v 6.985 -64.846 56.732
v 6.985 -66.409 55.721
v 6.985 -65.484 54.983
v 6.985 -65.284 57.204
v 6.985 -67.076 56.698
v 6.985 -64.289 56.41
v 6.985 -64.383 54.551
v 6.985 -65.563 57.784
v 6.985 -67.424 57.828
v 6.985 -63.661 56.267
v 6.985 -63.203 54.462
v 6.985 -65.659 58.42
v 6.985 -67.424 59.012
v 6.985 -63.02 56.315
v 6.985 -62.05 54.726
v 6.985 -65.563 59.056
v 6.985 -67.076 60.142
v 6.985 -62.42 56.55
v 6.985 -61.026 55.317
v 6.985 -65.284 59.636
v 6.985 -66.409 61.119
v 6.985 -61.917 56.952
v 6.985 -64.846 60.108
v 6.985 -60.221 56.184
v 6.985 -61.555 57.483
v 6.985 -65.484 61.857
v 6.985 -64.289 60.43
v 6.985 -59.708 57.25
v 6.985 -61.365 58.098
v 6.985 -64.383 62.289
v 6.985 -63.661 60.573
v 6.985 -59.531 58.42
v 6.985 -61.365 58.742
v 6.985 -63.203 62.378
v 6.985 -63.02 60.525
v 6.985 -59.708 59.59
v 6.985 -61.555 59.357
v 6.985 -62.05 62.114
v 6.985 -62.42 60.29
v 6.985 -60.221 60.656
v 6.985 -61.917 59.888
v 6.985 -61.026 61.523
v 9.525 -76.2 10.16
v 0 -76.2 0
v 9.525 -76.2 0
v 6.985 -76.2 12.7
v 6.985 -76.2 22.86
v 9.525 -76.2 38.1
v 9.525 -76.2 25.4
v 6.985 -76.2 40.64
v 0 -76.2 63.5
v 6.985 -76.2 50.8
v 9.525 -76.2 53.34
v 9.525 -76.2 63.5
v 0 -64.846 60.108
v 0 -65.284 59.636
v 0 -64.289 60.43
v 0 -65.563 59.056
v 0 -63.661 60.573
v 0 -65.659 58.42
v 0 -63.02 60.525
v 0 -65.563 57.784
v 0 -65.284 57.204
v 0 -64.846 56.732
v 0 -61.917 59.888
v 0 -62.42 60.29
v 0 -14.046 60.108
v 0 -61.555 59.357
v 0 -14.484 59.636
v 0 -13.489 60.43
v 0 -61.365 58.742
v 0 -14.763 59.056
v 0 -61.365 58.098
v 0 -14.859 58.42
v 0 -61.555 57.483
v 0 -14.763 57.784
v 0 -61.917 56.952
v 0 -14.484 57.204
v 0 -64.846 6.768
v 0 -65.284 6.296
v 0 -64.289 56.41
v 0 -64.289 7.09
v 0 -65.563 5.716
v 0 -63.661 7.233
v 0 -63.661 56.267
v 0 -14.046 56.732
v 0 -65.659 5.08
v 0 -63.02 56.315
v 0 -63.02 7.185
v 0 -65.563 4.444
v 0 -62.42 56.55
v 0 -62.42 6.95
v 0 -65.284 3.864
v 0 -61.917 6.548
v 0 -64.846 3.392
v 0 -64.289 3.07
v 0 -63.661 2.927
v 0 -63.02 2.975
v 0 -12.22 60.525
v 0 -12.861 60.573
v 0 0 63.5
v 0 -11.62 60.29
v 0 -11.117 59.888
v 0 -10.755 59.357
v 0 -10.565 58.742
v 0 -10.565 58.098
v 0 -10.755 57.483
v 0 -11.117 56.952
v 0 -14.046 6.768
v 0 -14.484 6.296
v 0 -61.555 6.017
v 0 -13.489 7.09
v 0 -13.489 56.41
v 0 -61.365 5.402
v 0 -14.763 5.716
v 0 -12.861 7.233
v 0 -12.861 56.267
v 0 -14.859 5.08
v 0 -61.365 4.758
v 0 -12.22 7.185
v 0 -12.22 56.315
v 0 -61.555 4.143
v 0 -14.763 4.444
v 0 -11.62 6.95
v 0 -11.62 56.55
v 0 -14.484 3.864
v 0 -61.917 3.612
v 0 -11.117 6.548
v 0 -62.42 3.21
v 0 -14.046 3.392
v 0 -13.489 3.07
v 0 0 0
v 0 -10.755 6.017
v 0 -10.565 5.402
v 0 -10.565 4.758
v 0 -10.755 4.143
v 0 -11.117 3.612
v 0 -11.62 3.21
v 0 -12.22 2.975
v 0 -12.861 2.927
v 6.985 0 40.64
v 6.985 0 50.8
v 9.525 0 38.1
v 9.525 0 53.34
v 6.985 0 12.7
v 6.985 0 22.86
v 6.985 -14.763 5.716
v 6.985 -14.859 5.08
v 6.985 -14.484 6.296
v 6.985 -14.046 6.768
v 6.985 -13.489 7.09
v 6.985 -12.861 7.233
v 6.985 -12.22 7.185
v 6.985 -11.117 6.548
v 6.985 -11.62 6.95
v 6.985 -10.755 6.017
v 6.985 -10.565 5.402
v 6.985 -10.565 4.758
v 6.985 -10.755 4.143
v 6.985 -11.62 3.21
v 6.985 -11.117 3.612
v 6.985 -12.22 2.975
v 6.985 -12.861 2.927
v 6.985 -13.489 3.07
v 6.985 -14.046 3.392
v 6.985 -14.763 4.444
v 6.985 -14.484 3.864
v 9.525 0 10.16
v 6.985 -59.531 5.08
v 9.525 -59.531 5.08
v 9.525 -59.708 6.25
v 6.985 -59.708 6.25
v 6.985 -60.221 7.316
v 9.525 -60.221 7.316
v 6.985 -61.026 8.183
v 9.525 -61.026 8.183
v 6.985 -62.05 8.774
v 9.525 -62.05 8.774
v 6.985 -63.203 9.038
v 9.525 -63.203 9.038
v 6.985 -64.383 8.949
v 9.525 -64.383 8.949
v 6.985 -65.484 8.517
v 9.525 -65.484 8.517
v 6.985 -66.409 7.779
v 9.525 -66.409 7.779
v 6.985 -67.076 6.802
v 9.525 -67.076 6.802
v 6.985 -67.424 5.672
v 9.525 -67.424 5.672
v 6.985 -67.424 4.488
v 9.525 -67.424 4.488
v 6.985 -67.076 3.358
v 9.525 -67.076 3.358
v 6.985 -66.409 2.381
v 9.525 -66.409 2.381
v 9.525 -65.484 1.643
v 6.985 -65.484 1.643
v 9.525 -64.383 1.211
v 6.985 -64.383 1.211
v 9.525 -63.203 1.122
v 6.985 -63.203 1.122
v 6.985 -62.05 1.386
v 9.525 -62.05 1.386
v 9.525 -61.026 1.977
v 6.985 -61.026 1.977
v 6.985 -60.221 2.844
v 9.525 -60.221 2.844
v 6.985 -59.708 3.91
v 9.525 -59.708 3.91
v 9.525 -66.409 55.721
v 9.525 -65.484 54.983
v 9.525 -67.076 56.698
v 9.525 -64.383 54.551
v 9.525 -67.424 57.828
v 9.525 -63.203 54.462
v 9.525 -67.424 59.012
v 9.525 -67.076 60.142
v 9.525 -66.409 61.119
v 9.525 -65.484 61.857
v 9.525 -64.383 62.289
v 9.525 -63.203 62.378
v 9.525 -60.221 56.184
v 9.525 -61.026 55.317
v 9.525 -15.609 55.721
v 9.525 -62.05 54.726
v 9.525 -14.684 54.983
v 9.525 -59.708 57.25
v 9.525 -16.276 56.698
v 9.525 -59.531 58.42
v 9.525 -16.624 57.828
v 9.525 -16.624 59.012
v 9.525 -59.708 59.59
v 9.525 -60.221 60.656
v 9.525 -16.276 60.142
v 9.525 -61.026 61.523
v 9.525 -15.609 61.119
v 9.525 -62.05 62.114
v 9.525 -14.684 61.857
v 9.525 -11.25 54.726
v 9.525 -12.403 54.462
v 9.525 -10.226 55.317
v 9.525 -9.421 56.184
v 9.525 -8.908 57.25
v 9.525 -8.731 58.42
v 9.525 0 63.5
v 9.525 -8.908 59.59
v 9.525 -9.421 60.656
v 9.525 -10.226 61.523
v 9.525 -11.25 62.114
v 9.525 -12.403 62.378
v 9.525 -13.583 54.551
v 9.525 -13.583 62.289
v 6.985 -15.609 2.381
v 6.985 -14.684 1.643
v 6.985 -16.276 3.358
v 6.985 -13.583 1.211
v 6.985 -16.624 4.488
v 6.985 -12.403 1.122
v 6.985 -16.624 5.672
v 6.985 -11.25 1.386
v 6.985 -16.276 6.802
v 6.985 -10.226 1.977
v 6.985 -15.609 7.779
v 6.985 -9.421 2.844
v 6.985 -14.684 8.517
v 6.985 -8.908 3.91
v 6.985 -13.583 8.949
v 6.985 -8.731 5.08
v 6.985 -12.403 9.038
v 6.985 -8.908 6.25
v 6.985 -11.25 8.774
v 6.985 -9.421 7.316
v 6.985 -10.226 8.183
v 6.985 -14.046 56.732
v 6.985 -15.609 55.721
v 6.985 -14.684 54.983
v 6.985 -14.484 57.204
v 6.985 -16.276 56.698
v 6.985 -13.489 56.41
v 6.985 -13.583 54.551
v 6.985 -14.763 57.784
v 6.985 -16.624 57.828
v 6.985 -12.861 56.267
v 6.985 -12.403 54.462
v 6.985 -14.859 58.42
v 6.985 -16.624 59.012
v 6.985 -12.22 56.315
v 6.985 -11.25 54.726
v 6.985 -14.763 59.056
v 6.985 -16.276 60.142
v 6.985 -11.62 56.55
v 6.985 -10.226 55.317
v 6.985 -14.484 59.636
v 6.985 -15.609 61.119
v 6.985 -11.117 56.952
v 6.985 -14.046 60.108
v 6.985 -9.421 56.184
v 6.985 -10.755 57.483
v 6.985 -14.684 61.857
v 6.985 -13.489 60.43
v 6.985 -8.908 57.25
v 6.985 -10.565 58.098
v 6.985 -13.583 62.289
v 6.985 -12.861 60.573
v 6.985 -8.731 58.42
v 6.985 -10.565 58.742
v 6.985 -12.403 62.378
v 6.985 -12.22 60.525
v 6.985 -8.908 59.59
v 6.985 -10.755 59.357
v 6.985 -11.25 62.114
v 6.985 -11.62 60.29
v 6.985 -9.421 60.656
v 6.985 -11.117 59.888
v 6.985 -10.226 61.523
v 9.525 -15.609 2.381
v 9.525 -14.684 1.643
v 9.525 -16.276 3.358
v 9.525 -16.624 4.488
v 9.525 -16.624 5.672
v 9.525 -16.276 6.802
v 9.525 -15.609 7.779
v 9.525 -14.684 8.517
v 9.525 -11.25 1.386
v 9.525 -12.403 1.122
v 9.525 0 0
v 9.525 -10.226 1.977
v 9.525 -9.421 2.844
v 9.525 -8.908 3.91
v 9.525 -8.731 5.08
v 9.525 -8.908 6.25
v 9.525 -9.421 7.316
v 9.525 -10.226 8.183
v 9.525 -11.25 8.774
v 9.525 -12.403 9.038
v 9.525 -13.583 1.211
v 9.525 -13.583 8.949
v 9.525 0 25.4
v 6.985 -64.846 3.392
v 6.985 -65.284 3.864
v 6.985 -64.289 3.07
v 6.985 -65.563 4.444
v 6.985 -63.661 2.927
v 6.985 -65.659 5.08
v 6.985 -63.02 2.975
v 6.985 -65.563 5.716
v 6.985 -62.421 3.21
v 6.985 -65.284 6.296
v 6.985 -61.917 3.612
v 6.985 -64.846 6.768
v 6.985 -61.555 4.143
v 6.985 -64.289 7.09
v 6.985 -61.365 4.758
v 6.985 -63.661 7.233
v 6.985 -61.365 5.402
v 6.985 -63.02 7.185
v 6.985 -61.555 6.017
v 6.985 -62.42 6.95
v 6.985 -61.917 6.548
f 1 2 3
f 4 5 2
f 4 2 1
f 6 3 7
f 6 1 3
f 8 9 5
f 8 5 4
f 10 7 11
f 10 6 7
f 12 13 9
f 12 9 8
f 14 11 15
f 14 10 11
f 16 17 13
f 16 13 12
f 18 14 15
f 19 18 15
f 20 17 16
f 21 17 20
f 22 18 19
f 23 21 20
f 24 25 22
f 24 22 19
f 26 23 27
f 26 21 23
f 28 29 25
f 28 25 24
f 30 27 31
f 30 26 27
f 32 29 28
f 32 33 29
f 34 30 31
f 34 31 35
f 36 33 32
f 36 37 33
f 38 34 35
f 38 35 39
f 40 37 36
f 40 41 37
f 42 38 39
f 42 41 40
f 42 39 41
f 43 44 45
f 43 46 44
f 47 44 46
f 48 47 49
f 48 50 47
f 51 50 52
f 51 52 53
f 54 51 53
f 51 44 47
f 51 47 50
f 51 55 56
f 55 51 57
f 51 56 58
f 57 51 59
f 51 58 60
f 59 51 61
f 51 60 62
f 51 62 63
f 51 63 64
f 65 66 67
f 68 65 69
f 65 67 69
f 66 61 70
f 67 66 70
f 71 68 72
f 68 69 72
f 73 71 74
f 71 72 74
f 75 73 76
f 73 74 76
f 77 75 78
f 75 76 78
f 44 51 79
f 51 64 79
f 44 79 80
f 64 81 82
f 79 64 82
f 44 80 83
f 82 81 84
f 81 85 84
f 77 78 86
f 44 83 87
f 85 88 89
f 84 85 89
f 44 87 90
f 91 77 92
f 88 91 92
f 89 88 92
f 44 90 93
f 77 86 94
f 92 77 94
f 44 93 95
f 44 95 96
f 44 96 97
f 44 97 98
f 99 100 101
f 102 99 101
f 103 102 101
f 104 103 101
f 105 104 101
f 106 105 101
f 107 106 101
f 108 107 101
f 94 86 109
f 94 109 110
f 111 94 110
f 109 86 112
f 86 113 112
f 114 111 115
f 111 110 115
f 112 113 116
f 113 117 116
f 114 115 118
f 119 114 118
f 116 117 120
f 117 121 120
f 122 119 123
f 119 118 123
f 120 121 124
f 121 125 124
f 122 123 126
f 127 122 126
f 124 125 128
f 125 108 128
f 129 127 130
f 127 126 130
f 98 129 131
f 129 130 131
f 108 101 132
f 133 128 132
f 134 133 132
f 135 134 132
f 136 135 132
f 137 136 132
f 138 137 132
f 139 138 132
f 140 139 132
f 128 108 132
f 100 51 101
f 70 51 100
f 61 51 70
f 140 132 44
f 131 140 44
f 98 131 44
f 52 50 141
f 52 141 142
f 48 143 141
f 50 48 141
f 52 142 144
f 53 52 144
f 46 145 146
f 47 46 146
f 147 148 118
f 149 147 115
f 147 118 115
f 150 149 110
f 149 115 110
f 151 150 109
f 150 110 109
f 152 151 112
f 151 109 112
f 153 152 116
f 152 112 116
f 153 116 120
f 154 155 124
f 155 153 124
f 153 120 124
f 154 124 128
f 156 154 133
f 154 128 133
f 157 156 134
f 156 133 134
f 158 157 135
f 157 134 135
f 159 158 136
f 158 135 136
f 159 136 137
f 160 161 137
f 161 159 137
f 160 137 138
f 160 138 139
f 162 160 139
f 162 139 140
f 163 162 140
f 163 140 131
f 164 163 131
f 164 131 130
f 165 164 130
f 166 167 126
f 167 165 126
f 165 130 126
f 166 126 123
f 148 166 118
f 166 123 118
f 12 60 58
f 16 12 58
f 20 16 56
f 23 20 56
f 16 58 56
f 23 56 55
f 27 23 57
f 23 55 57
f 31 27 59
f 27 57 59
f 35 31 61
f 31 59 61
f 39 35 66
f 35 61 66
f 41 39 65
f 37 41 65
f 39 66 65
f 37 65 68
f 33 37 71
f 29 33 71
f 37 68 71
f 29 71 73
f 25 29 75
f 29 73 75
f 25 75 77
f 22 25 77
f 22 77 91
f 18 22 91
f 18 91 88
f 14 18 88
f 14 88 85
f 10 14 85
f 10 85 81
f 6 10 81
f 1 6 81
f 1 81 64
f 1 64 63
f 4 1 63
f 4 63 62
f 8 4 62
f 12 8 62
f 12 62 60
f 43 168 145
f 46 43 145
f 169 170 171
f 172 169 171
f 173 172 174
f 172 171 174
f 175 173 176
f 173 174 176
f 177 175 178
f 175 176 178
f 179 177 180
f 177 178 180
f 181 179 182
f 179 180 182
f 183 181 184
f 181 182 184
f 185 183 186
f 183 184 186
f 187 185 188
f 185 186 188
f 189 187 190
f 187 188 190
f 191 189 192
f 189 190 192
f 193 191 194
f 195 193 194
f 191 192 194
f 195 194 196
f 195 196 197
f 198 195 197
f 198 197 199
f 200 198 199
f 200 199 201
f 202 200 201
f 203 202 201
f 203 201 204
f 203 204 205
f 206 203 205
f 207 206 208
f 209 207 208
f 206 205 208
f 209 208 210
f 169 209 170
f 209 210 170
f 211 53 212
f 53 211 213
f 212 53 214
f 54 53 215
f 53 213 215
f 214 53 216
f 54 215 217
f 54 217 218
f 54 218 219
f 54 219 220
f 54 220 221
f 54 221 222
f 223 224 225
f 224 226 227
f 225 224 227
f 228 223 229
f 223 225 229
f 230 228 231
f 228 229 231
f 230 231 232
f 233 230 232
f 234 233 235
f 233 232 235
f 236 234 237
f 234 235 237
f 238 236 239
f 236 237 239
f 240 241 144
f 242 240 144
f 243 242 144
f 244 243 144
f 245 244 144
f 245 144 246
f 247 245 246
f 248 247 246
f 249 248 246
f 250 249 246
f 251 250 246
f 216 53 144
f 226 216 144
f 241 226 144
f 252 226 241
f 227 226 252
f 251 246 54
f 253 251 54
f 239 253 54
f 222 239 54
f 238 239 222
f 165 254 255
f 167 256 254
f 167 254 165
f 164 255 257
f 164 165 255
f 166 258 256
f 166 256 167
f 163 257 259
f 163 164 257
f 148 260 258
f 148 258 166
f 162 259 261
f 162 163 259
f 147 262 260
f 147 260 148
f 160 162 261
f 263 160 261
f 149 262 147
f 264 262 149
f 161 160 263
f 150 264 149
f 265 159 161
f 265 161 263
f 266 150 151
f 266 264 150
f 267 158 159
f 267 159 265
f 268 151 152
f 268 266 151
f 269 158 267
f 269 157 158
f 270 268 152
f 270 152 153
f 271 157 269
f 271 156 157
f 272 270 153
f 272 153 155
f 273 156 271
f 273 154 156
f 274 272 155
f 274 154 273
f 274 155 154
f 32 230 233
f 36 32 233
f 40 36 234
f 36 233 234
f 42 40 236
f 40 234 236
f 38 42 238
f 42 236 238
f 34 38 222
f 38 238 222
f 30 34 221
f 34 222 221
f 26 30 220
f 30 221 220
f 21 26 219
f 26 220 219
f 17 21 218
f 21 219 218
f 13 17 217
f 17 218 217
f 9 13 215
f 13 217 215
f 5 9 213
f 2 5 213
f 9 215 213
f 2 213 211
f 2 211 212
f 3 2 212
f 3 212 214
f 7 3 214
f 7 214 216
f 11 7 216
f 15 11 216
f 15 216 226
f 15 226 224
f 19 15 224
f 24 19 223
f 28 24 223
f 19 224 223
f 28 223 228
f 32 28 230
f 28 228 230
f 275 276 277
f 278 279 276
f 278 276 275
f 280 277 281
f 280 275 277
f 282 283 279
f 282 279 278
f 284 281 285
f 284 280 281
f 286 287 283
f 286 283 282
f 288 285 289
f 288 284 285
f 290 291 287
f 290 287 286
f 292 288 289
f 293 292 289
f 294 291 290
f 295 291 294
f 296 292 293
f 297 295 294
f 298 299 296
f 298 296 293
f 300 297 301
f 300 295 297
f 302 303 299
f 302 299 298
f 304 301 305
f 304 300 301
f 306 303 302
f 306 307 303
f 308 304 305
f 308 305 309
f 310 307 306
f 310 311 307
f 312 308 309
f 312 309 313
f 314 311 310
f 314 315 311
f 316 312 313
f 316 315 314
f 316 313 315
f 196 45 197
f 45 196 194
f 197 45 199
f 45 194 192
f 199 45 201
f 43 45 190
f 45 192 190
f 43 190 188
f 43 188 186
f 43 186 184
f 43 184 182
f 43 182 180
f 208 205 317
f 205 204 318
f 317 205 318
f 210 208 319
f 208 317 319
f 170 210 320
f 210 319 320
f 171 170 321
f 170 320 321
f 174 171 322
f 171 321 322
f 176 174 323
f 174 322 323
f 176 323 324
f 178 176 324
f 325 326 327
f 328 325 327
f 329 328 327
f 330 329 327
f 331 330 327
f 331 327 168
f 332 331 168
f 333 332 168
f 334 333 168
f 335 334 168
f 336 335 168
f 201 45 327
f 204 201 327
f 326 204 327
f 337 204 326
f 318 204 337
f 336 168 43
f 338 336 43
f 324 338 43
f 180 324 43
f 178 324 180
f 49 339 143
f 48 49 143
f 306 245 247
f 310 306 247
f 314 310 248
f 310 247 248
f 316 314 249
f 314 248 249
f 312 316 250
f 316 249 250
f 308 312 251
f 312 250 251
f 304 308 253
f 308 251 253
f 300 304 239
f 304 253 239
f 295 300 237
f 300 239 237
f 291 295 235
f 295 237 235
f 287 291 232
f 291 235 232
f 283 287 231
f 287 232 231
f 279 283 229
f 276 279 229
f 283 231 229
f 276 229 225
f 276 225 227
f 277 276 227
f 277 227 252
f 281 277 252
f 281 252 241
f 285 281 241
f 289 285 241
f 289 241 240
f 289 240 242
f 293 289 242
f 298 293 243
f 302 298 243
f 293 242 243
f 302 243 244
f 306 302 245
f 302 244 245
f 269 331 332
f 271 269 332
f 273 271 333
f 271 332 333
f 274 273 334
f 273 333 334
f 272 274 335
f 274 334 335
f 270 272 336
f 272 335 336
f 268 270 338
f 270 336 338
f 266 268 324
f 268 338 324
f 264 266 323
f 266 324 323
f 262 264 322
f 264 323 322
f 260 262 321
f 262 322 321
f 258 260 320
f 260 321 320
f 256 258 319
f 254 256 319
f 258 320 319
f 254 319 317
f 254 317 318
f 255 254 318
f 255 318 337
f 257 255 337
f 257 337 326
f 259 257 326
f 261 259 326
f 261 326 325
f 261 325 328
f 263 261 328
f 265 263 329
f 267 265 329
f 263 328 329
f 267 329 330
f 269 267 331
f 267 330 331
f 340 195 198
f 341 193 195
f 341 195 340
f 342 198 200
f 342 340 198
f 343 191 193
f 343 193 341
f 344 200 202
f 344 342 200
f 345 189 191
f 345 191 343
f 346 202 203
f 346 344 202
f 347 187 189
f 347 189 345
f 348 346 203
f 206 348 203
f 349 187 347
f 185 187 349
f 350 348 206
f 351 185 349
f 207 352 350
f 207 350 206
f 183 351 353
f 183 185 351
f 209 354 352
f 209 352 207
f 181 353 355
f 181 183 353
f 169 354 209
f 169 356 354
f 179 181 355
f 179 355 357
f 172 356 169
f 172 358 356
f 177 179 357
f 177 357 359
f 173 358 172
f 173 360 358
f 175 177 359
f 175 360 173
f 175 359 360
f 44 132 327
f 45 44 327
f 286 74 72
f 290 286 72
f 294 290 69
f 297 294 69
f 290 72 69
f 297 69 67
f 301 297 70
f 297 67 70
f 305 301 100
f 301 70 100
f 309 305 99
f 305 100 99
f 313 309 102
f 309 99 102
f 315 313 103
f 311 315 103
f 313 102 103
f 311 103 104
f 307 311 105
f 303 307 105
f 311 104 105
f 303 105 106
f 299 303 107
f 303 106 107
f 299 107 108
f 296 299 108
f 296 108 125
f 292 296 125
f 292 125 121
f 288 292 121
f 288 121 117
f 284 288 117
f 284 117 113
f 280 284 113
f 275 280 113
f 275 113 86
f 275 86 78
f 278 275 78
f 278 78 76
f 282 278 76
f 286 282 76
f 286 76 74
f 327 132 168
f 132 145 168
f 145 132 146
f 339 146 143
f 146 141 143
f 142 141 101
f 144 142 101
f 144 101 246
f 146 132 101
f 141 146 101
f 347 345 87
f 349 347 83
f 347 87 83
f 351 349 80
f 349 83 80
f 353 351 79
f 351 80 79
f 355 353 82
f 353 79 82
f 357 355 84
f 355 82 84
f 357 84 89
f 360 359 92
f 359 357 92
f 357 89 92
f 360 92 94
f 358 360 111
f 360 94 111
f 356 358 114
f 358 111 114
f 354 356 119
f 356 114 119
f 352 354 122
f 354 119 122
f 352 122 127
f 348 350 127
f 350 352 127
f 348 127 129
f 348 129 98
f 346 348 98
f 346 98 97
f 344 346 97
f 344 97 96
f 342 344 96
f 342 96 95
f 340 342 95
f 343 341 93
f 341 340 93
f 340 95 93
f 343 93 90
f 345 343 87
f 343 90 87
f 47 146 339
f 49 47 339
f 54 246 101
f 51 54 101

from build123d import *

# Parameters (mm, degrees)
F1_DEPTH = 76.2
F4_D     = 4.318
F4_DEPTH = 12.7
F4_TIP   = 1.2972580765
F5_R     = 3.96875
F5_R_2   = 2.159
F6_DEPTH = 2.54


with BuildPart() as f1:
    # F0 (on Front) → F1 (new body)
    with BuildSketch(Plane.XZ):
        Polygon((0, 63.5), (0, 0), (9.525, 0), (9.525, 10.16), (6.985, 12.7), (6.985, 22.86), (9.525, 25.4), (9.525, 38.1), (6.985, 40.64), (6.985, 50.8), (9.525, 53.34), (9.525, 63.5), align=None)
    extrude(amount=F1_DEPTH)

    # F4
    with Locations(Plane.YZ.offset(9.525)):
        with Locations((-63.5, 58.42), (-12.7, 58.42), (-63.5, 5.08), (-12.7, 5.08)):
            Hole(F4_D / 2, depth=F4_DEPTH)
            with Locations((0, 0, -(F4_DEPTH + F4_TIP / 2))):  # 118° drill point
                Cone(0, F4_D / 2, F4_TIP, mode=Mode.SUBTRACT)

    # F5 (on face) → F6 (cut)
    with BuildSketch(Plane.YZ.offset(9.525)):
        with Locations((-63.5, 58.42)):
            Circle(F5_R)
        with Locations((-12.7, 58.42)):
            Circle(F5_R)
        with Locations((-63.5, 5.08)):
            Circle(F5_R)
        with Locations((-63.5, 5.08)):
            Circle(F5_R_2, mode=Mode.SUBTRACT)
        with Locations((-12.7, 5.08)):
            Circle(F5_R)
        with Locations((-12.7, 5.08)):
            Circle(F5_R_2, mode=Mode.SUBTRACT)
    extrude(amount=-F6_DEPTH, mode=Mode.SUBTRACT)


solid = f1.part
